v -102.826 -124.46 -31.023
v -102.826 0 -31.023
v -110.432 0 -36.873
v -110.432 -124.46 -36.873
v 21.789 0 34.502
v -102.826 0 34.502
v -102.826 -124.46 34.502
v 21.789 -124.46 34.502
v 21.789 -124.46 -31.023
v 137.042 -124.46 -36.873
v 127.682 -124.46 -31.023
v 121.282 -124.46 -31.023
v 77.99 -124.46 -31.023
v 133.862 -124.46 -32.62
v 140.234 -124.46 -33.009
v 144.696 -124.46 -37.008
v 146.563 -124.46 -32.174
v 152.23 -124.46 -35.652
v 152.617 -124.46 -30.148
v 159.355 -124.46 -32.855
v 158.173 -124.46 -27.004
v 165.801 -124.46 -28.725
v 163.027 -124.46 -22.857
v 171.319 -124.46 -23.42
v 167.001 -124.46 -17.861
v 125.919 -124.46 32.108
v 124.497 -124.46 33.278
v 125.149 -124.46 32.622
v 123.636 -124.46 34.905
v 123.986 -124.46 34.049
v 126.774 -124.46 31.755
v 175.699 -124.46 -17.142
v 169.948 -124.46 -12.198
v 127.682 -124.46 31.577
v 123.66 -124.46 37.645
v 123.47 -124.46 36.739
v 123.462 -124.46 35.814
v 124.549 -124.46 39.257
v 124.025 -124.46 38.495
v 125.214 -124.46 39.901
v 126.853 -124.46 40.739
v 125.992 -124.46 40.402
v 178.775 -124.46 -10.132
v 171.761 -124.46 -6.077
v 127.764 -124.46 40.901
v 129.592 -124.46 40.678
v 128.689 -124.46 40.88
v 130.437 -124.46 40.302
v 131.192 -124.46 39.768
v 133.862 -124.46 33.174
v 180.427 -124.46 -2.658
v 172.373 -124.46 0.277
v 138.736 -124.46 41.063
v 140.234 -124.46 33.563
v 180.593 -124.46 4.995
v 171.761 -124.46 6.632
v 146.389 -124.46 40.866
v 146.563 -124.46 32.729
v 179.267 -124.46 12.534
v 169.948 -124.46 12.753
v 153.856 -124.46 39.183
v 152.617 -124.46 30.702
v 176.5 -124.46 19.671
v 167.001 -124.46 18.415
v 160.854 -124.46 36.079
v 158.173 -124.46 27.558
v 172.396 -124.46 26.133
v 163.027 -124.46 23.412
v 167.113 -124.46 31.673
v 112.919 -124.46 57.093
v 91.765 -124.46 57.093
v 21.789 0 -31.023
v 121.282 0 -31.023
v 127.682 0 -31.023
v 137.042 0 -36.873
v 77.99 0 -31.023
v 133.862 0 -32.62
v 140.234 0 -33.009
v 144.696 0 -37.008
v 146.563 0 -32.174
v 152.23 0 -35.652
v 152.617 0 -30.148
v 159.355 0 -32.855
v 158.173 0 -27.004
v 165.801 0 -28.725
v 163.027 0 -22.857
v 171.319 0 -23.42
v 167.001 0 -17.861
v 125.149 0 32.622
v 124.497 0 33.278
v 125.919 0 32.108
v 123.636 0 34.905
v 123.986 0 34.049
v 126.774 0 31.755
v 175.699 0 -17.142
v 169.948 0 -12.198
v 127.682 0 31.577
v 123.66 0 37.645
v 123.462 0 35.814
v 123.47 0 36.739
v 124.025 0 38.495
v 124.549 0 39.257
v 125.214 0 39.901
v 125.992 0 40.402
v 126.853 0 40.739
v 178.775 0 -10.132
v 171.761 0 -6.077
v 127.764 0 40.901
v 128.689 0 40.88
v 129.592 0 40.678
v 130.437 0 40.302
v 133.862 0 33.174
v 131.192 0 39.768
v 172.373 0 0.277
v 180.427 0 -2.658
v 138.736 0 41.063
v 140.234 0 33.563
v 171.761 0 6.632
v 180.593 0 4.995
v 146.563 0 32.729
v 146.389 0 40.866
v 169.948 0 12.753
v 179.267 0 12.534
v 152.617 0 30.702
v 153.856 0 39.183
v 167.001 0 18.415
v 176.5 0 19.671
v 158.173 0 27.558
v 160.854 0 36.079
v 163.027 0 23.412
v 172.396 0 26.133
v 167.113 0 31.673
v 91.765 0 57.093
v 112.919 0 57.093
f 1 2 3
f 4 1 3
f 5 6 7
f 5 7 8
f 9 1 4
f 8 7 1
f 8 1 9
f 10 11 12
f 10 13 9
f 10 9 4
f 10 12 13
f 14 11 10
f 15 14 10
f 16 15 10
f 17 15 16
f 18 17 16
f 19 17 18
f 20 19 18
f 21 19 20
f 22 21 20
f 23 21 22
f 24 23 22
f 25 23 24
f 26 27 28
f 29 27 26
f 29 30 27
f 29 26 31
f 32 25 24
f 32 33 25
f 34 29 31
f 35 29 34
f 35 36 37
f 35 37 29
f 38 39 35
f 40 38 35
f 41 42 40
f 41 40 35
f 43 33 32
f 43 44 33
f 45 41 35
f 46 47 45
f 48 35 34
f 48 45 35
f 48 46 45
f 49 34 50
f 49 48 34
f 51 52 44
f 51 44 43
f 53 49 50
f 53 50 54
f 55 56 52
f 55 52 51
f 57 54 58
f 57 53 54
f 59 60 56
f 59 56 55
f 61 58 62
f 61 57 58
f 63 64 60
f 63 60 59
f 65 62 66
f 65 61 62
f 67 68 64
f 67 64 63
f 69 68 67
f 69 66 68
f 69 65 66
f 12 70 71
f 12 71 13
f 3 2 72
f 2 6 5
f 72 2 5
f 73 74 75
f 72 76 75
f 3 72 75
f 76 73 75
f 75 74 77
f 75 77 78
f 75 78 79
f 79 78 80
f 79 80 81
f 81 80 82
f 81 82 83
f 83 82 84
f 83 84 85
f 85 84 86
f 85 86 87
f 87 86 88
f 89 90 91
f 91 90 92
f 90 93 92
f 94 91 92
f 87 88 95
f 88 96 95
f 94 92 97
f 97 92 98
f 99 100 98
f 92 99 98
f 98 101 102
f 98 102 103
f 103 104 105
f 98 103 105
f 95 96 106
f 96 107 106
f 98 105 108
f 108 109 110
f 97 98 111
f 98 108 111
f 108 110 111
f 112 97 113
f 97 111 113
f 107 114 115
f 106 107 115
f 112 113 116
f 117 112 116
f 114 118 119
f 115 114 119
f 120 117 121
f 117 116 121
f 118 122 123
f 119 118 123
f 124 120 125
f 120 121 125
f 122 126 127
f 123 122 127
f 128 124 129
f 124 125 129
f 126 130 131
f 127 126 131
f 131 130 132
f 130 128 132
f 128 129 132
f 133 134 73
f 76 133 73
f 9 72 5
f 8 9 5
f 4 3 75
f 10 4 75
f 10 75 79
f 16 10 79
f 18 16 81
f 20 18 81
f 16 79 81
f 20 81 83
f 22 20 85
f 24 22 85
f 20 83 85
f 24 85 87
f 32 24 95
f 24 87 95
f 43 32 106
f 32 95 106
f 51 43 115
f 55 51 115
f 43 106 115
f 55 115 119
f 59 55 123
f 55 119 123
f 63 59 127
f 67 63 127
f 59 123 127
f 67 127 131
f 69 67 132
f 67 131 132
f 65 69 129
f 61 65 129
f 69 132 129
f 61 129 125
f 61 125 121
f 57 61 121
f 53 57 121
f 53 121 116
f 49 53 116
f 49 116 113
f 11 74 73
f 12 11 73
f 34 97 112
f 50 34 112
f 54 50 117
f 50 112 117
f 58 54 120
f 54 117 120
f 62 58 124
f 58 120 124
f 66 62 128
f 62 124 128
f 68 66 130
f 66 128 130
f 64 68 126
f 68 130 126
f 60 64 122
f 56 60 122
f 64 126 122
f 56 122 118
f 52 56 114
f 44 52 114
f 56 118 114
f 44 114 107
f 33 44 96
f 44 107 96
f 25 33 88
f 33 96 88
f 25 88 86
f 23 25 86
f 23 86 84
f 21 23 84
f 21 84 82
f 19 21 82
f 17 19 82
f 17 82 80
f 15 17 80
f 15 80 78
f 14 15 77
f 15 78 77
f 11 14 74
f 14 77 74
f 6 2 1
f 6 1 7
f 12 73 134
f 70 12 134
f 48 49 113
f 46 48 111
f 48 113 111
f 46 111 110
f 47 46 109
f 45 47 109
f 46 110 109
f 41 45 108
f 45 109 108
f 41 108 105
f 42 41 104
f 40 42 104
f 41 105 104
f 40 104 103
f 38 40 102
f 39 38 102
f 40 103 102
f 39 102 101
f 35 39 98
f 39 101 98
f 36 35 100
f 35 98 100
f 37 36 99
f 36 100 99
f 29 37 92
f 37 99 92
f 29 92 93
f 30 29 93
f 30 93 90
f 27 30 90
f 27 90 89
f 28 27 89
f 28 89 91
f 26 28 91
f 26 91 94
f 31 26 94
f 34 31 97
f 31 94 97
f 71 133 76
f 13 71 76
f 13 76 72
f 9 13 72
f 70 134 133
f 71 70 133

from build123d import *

# Parameters (mm, degrees)
F0_W     = 124.614488
F0_H     = 65.524992
F1_DEPTH = 124.46


with BuildPart() as f1:
    # F0 (on Front) → F1 (new body)
    with BuildSketch(Plane.XZ):
        with Locations((-40.518718, 1.739735)):
            Rectangle(F0_W, F0_H)
        Polygon((21.788526, -31.022761), (-102.825962, -31.022761), (-110.431544, -36.873206), (137.042314, -36.873206), (127.681583, -31.022761), (121.282354, -31.022761), (77.989712, -31.022761), align=None)
        Polygon((91.764651, 57.09333), (77.989712, -31.022761), (121.282354, -31.022761), (112.919003, 57.09333), align=None)
        with BuildLine():
            Line((127.681583, -31.022761), (137.042314, -36.873206))
            ThreePointArc((137.042314, -36.873206), (180.593446, 4.995028), (131.191865, 39.76763))
            ThreePointArc((131.191865, 39.76763), (123.821562, 38.078823), (127.681583, 31.577002))
            ThreePointArc((127.681583, 31.577002), (172.372699, 0.277121), (127.681583, -31.022761))
        make_face()
    extrude(amount=F1_DEPTH)


solid = f1.part
